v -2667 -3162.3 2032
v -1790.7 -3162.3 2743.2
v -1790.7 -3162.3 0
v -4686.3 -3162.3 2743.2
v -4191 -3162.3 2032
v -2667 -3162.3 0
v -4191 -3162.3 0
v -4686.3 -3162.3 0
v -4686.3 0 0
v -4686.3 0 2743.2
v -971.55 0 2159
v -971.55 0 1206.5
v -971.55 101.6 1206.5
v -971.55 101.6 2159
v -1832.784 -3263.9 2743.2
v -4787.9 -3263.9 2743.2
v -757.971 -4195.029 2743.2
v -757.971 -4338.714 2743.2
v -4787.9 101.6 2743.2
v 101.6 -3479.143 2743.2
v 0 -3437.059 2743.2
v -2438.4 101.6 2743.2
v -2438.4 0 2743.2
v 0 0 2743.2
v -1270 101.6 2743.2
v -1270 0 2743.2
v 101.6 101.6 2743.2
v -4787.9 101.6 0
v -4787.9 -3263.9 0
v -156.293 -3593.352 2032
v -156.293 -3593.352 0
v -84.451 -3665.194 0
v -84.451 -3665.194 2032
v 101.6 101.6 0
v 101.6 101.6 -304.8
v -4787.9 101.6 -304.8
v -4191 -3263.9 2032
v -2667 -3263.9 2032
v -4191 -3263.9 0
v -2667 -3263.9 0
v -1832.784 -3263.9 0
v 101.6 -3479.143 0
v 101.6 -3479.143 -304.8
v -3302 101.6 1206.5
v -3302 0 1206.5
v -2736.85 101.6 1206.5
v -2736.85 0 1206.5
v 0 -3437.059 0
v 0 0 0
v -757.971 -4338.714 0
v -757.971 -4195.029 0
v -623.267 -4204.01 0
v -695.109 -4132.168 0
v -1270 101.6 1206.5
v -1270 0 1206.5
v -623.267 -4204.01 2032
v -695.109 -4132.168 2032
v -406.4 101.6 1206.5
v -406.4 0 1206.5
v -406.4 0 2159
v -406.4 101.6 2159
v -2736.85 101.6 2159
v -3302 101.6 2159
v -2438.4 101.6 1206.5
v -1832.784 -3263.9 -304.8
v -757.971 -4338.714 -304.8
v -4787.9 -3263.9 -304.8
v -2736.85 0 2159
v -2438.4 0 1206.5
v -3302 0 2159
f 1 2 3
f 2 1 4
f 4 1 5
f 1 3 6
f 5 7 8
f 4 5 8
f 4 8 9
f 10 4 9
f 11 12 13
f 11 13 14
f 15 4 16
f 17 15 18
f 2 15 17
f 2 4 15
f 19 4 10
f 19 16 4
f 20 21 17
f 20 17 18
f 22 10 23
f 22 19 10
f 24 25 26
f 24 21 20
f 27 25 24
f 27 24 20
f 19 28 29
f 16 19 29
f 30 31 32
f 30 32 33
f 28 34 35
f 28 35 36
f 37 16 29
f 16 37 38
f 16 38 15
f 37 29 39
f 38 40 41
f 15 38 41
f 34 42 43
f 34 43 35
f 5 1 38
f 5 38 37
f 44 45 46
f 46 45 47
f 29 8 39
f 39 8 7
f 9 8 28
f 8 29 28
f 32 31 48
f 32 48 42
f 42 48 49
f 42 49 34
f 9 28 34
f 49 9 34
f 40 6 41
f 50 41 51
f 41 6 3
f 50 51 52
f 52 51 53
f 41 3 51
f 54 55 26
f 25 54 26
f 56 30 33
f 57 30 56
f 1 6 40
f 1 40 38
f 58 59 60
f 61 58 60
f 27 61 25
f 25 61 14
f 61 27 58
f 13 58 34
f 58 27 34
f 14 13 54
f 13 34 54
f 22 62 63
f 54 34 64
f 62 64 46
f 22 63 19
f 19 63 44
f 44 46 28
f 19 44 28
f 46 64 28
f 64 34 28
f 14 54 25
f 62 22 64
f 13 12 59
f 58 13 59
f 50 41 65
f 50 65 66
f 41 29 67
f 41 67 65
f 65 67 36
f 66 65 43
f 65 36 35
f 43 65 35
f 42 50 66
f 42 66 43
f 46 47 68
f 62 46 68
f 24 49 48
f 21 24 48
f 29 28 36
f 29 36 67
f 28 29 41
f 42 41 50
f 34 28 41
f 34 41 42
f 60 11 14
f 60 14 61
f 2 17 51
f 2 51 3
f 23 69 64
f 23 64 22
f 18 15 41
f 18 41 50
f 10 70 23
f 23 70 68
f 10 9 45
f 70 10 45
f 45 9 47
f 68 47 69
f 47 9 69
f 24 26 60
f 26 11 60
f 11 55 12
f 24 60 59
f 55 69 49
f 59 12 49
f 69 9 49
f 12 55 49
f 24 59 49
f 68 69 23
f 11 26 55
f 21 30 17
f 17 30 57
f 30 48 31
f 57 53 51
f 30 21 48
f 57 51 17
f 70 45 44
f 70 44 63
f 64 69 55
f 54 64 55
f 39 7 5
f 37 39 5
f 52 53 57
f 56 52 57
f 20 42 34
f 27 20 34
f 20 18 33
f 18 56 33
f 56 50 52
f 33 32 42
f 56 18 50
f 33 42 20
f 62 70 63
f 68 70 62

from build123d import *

# Parameters (mm, degrees)
F1_DEPTH = 2743.2
F3_DEPTH = 304.8
F4_W     = 762
F4_H     = 2032
F5_DEPTH = 709.409162
F6_W     = 1524
F6_H     = 2032
F7_DEPTH = 1176.414552
F8_W     = 565.15
F8_H     = 952.5
F8_W_2   = 1168.4
F8_H_2   = 1536.7
F9_DEPTH = 101.601


with BuildPart() as f1:
    # F0 (on Top) → F1 (new body)
    with BuildSketch(Plane.XY):
        Polygon((101.6, 101.6), (-4787.9, 101.6), (-4787.9, -3263.9), (-1832.784098, -3263.9), (-757.970546, -4338.713552), (101.6, -3479.143006), align=None)
        Polygon((-4686.3, 0), (0, 0), (0, -3437.058908), (-757.970546, -4195.029454), (-1790.7, -3162.3), (-4686.3, -3162.3), align=None, mode=Mode.SUBTRACT)
    extrude(amount=F1_DEPTH)

    # F4 (on face) → F5 (cut, through all)
    with BuildSketch(Plane(origin=(1718.529454, -1718.529454, 0), x_dir=(-0.707107, -0.707107, 0), z_dir=(-0.707107, 0.707107, 0))):
        with Locations((3032.399887, 1016)):
            Rectangle(F4_W, F4_H)
    extrude(amount=-F5_DEPTH, mode=Mode.SUBTRACT)

    # F6 (on face) → F7 (cut, through all)
    with BuildSketch(Plane(origin=(0, -3162.3, 0), x_dir=(-1, 0, 0), z_dir=(0, 1, 0))):
        with Locations((3429, 1016)):
            Rectangle(F6_W, F6_H)
    extrude(amount=-F7_DEPTH, mode=Mode.SUBTRACT)

    # F8 (on face) → F9 (cut, through all)
    with BuildSketch(Plane.XZ):
        with Locations((-3019.425, 1682.75)):
            Rectangle(F8_W, F8_H)
        with Locations((-1854.2, 1974.85)):
            Rectangle(F8_W_2, F8_H_2)
        with Locations((-688.975, 1682.75)):
            Rectangle(F8_W, F8_H)
    extrude(amount=-F9_DEPTH, mode=Mode.SUBTRACT)


with BuildPart() as f3:
    # F2 (on Top) → F3 (new body)
    with BuildSketch(Plane.XY):
        Polygon((101.6, -3479.143006), (101.6, 101.6), (-4787.9, 101.6), (-4787.9, -3263.9), (-1832.784098, -3263.9), (-757.970546, -4338.713552), align=None)
    extrude(amount=-F3_DEPTH)


solid = Compound([f1.part, f3.part])
